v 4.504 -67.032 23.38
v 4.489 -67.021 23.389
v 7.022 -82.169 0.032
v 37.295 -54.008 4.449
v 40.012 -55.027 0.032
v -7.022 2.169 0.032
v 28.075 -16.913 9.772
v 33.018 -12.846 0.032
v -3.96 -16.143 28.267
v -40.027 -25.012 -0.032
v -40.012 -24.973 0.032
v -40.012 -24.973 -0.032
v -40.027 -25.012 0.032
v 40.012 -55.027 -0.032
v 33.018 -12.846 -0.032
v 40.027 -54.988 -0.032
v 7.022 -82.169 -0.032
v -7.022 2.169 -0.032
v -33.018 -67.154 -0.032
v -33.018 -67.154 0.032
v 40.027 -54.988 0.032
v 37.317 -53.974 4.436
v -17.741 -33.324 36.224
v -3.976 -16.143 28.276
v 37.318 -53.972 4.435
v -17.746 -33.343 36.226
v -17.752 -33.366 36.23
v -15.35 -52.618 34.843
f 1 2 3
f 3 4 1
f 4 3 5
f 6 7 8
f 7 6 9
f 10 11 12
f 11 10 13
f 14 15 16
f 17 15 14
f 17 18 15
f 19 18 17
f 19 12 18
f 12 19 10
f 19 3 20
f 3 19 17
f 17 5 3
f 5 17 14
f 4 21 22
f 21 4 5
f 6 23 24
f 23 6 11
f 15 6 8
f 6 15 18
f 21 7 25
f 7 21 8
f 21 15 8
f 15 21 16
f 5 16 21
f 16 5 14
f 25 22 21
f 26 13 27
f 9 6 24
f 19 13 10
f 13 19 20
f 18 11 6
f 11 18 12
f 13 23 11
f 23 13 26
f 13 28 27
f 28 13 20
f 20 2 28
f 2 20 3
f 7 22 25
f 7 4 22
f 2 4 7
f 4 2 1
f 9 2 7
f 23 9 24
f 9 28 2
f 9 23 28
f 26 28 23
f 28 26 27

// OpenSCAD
// file: deskriptiva.scad
module unitTriangle() {
	linear_extrude(0.01)
	polygon([[0, 0], [u, 0], [0, u]]);
}

module unitParallelogram() {
	linear_extrude(0.01)
	polygon([[0, 0], [u, 0], [0, u], [-u, u]]);
}

module unitPyramid(n) {
	step = 360 / n;
		hull() {
		for (i = [0: n]) {
			translate([cos(i*step) * u, sin(i*step) * u, 0]) cube(0.01, center=true);
		}
		translate([0, 0, u]) cube(0.01, center=true);
	}
}

module unitLine() {
	translate([u/2, 0, 0]) cube([u, 0.01, 0.01], center=true);
}

module magnify(thickness) {
	minkowski() {
		children();
		sphere(thickness);
	}
}

module transform(A, B, C) {
	// all y coords are switched
    dA = [0, 0, 0];
    dB = [B.x - A.x, - B.y + A.y, B.z - A.z];
    dC = [C.x - A.x, - C.y + A.y, C.z - A.z];
    m = [
        [dB.x, dC.x, 1, u*A.x],
        [dB.y, dC.y, 1, -u*A.y],
        [dB.z, dC.z, 1, u*A.z],
        [0, 0, 0, 1]
    ];
    
    multmatrix(m) children();
} 

module oneAxisTransform(S, A, V) {
	// all y coords are switched
    dS = [0, 0, 0];
    dA = [A.x - S.x, - A.y + S.y, A.z - S.z];
    dV = [V.x - S.x, - V.y + S.y, V.z - S.z];
	dANormal = cross([0, 0, 1], dA);
    m = [
        [dA.x, dANormal.x, dV.x, u*S.x],
        [dA.y, dANormal.y,dV.y, -u*S.y],
        [dA.z, dANormal.z, dV.z, u*S.z],
        [0, 0, 0, 1]
    ];
    
    multmatrix(m) children();
}
// main file
u = 10;
include<deskriptiva.scad>

difference() {
	oneAxisTransform([0, 4, 0], [-4, 2.5, 0], [0, 4, 6.5])
	unitPyramid(6);

	translate([4.5*u, -100, 0]) rotate([0, -60, 0]) cube(200);
}
